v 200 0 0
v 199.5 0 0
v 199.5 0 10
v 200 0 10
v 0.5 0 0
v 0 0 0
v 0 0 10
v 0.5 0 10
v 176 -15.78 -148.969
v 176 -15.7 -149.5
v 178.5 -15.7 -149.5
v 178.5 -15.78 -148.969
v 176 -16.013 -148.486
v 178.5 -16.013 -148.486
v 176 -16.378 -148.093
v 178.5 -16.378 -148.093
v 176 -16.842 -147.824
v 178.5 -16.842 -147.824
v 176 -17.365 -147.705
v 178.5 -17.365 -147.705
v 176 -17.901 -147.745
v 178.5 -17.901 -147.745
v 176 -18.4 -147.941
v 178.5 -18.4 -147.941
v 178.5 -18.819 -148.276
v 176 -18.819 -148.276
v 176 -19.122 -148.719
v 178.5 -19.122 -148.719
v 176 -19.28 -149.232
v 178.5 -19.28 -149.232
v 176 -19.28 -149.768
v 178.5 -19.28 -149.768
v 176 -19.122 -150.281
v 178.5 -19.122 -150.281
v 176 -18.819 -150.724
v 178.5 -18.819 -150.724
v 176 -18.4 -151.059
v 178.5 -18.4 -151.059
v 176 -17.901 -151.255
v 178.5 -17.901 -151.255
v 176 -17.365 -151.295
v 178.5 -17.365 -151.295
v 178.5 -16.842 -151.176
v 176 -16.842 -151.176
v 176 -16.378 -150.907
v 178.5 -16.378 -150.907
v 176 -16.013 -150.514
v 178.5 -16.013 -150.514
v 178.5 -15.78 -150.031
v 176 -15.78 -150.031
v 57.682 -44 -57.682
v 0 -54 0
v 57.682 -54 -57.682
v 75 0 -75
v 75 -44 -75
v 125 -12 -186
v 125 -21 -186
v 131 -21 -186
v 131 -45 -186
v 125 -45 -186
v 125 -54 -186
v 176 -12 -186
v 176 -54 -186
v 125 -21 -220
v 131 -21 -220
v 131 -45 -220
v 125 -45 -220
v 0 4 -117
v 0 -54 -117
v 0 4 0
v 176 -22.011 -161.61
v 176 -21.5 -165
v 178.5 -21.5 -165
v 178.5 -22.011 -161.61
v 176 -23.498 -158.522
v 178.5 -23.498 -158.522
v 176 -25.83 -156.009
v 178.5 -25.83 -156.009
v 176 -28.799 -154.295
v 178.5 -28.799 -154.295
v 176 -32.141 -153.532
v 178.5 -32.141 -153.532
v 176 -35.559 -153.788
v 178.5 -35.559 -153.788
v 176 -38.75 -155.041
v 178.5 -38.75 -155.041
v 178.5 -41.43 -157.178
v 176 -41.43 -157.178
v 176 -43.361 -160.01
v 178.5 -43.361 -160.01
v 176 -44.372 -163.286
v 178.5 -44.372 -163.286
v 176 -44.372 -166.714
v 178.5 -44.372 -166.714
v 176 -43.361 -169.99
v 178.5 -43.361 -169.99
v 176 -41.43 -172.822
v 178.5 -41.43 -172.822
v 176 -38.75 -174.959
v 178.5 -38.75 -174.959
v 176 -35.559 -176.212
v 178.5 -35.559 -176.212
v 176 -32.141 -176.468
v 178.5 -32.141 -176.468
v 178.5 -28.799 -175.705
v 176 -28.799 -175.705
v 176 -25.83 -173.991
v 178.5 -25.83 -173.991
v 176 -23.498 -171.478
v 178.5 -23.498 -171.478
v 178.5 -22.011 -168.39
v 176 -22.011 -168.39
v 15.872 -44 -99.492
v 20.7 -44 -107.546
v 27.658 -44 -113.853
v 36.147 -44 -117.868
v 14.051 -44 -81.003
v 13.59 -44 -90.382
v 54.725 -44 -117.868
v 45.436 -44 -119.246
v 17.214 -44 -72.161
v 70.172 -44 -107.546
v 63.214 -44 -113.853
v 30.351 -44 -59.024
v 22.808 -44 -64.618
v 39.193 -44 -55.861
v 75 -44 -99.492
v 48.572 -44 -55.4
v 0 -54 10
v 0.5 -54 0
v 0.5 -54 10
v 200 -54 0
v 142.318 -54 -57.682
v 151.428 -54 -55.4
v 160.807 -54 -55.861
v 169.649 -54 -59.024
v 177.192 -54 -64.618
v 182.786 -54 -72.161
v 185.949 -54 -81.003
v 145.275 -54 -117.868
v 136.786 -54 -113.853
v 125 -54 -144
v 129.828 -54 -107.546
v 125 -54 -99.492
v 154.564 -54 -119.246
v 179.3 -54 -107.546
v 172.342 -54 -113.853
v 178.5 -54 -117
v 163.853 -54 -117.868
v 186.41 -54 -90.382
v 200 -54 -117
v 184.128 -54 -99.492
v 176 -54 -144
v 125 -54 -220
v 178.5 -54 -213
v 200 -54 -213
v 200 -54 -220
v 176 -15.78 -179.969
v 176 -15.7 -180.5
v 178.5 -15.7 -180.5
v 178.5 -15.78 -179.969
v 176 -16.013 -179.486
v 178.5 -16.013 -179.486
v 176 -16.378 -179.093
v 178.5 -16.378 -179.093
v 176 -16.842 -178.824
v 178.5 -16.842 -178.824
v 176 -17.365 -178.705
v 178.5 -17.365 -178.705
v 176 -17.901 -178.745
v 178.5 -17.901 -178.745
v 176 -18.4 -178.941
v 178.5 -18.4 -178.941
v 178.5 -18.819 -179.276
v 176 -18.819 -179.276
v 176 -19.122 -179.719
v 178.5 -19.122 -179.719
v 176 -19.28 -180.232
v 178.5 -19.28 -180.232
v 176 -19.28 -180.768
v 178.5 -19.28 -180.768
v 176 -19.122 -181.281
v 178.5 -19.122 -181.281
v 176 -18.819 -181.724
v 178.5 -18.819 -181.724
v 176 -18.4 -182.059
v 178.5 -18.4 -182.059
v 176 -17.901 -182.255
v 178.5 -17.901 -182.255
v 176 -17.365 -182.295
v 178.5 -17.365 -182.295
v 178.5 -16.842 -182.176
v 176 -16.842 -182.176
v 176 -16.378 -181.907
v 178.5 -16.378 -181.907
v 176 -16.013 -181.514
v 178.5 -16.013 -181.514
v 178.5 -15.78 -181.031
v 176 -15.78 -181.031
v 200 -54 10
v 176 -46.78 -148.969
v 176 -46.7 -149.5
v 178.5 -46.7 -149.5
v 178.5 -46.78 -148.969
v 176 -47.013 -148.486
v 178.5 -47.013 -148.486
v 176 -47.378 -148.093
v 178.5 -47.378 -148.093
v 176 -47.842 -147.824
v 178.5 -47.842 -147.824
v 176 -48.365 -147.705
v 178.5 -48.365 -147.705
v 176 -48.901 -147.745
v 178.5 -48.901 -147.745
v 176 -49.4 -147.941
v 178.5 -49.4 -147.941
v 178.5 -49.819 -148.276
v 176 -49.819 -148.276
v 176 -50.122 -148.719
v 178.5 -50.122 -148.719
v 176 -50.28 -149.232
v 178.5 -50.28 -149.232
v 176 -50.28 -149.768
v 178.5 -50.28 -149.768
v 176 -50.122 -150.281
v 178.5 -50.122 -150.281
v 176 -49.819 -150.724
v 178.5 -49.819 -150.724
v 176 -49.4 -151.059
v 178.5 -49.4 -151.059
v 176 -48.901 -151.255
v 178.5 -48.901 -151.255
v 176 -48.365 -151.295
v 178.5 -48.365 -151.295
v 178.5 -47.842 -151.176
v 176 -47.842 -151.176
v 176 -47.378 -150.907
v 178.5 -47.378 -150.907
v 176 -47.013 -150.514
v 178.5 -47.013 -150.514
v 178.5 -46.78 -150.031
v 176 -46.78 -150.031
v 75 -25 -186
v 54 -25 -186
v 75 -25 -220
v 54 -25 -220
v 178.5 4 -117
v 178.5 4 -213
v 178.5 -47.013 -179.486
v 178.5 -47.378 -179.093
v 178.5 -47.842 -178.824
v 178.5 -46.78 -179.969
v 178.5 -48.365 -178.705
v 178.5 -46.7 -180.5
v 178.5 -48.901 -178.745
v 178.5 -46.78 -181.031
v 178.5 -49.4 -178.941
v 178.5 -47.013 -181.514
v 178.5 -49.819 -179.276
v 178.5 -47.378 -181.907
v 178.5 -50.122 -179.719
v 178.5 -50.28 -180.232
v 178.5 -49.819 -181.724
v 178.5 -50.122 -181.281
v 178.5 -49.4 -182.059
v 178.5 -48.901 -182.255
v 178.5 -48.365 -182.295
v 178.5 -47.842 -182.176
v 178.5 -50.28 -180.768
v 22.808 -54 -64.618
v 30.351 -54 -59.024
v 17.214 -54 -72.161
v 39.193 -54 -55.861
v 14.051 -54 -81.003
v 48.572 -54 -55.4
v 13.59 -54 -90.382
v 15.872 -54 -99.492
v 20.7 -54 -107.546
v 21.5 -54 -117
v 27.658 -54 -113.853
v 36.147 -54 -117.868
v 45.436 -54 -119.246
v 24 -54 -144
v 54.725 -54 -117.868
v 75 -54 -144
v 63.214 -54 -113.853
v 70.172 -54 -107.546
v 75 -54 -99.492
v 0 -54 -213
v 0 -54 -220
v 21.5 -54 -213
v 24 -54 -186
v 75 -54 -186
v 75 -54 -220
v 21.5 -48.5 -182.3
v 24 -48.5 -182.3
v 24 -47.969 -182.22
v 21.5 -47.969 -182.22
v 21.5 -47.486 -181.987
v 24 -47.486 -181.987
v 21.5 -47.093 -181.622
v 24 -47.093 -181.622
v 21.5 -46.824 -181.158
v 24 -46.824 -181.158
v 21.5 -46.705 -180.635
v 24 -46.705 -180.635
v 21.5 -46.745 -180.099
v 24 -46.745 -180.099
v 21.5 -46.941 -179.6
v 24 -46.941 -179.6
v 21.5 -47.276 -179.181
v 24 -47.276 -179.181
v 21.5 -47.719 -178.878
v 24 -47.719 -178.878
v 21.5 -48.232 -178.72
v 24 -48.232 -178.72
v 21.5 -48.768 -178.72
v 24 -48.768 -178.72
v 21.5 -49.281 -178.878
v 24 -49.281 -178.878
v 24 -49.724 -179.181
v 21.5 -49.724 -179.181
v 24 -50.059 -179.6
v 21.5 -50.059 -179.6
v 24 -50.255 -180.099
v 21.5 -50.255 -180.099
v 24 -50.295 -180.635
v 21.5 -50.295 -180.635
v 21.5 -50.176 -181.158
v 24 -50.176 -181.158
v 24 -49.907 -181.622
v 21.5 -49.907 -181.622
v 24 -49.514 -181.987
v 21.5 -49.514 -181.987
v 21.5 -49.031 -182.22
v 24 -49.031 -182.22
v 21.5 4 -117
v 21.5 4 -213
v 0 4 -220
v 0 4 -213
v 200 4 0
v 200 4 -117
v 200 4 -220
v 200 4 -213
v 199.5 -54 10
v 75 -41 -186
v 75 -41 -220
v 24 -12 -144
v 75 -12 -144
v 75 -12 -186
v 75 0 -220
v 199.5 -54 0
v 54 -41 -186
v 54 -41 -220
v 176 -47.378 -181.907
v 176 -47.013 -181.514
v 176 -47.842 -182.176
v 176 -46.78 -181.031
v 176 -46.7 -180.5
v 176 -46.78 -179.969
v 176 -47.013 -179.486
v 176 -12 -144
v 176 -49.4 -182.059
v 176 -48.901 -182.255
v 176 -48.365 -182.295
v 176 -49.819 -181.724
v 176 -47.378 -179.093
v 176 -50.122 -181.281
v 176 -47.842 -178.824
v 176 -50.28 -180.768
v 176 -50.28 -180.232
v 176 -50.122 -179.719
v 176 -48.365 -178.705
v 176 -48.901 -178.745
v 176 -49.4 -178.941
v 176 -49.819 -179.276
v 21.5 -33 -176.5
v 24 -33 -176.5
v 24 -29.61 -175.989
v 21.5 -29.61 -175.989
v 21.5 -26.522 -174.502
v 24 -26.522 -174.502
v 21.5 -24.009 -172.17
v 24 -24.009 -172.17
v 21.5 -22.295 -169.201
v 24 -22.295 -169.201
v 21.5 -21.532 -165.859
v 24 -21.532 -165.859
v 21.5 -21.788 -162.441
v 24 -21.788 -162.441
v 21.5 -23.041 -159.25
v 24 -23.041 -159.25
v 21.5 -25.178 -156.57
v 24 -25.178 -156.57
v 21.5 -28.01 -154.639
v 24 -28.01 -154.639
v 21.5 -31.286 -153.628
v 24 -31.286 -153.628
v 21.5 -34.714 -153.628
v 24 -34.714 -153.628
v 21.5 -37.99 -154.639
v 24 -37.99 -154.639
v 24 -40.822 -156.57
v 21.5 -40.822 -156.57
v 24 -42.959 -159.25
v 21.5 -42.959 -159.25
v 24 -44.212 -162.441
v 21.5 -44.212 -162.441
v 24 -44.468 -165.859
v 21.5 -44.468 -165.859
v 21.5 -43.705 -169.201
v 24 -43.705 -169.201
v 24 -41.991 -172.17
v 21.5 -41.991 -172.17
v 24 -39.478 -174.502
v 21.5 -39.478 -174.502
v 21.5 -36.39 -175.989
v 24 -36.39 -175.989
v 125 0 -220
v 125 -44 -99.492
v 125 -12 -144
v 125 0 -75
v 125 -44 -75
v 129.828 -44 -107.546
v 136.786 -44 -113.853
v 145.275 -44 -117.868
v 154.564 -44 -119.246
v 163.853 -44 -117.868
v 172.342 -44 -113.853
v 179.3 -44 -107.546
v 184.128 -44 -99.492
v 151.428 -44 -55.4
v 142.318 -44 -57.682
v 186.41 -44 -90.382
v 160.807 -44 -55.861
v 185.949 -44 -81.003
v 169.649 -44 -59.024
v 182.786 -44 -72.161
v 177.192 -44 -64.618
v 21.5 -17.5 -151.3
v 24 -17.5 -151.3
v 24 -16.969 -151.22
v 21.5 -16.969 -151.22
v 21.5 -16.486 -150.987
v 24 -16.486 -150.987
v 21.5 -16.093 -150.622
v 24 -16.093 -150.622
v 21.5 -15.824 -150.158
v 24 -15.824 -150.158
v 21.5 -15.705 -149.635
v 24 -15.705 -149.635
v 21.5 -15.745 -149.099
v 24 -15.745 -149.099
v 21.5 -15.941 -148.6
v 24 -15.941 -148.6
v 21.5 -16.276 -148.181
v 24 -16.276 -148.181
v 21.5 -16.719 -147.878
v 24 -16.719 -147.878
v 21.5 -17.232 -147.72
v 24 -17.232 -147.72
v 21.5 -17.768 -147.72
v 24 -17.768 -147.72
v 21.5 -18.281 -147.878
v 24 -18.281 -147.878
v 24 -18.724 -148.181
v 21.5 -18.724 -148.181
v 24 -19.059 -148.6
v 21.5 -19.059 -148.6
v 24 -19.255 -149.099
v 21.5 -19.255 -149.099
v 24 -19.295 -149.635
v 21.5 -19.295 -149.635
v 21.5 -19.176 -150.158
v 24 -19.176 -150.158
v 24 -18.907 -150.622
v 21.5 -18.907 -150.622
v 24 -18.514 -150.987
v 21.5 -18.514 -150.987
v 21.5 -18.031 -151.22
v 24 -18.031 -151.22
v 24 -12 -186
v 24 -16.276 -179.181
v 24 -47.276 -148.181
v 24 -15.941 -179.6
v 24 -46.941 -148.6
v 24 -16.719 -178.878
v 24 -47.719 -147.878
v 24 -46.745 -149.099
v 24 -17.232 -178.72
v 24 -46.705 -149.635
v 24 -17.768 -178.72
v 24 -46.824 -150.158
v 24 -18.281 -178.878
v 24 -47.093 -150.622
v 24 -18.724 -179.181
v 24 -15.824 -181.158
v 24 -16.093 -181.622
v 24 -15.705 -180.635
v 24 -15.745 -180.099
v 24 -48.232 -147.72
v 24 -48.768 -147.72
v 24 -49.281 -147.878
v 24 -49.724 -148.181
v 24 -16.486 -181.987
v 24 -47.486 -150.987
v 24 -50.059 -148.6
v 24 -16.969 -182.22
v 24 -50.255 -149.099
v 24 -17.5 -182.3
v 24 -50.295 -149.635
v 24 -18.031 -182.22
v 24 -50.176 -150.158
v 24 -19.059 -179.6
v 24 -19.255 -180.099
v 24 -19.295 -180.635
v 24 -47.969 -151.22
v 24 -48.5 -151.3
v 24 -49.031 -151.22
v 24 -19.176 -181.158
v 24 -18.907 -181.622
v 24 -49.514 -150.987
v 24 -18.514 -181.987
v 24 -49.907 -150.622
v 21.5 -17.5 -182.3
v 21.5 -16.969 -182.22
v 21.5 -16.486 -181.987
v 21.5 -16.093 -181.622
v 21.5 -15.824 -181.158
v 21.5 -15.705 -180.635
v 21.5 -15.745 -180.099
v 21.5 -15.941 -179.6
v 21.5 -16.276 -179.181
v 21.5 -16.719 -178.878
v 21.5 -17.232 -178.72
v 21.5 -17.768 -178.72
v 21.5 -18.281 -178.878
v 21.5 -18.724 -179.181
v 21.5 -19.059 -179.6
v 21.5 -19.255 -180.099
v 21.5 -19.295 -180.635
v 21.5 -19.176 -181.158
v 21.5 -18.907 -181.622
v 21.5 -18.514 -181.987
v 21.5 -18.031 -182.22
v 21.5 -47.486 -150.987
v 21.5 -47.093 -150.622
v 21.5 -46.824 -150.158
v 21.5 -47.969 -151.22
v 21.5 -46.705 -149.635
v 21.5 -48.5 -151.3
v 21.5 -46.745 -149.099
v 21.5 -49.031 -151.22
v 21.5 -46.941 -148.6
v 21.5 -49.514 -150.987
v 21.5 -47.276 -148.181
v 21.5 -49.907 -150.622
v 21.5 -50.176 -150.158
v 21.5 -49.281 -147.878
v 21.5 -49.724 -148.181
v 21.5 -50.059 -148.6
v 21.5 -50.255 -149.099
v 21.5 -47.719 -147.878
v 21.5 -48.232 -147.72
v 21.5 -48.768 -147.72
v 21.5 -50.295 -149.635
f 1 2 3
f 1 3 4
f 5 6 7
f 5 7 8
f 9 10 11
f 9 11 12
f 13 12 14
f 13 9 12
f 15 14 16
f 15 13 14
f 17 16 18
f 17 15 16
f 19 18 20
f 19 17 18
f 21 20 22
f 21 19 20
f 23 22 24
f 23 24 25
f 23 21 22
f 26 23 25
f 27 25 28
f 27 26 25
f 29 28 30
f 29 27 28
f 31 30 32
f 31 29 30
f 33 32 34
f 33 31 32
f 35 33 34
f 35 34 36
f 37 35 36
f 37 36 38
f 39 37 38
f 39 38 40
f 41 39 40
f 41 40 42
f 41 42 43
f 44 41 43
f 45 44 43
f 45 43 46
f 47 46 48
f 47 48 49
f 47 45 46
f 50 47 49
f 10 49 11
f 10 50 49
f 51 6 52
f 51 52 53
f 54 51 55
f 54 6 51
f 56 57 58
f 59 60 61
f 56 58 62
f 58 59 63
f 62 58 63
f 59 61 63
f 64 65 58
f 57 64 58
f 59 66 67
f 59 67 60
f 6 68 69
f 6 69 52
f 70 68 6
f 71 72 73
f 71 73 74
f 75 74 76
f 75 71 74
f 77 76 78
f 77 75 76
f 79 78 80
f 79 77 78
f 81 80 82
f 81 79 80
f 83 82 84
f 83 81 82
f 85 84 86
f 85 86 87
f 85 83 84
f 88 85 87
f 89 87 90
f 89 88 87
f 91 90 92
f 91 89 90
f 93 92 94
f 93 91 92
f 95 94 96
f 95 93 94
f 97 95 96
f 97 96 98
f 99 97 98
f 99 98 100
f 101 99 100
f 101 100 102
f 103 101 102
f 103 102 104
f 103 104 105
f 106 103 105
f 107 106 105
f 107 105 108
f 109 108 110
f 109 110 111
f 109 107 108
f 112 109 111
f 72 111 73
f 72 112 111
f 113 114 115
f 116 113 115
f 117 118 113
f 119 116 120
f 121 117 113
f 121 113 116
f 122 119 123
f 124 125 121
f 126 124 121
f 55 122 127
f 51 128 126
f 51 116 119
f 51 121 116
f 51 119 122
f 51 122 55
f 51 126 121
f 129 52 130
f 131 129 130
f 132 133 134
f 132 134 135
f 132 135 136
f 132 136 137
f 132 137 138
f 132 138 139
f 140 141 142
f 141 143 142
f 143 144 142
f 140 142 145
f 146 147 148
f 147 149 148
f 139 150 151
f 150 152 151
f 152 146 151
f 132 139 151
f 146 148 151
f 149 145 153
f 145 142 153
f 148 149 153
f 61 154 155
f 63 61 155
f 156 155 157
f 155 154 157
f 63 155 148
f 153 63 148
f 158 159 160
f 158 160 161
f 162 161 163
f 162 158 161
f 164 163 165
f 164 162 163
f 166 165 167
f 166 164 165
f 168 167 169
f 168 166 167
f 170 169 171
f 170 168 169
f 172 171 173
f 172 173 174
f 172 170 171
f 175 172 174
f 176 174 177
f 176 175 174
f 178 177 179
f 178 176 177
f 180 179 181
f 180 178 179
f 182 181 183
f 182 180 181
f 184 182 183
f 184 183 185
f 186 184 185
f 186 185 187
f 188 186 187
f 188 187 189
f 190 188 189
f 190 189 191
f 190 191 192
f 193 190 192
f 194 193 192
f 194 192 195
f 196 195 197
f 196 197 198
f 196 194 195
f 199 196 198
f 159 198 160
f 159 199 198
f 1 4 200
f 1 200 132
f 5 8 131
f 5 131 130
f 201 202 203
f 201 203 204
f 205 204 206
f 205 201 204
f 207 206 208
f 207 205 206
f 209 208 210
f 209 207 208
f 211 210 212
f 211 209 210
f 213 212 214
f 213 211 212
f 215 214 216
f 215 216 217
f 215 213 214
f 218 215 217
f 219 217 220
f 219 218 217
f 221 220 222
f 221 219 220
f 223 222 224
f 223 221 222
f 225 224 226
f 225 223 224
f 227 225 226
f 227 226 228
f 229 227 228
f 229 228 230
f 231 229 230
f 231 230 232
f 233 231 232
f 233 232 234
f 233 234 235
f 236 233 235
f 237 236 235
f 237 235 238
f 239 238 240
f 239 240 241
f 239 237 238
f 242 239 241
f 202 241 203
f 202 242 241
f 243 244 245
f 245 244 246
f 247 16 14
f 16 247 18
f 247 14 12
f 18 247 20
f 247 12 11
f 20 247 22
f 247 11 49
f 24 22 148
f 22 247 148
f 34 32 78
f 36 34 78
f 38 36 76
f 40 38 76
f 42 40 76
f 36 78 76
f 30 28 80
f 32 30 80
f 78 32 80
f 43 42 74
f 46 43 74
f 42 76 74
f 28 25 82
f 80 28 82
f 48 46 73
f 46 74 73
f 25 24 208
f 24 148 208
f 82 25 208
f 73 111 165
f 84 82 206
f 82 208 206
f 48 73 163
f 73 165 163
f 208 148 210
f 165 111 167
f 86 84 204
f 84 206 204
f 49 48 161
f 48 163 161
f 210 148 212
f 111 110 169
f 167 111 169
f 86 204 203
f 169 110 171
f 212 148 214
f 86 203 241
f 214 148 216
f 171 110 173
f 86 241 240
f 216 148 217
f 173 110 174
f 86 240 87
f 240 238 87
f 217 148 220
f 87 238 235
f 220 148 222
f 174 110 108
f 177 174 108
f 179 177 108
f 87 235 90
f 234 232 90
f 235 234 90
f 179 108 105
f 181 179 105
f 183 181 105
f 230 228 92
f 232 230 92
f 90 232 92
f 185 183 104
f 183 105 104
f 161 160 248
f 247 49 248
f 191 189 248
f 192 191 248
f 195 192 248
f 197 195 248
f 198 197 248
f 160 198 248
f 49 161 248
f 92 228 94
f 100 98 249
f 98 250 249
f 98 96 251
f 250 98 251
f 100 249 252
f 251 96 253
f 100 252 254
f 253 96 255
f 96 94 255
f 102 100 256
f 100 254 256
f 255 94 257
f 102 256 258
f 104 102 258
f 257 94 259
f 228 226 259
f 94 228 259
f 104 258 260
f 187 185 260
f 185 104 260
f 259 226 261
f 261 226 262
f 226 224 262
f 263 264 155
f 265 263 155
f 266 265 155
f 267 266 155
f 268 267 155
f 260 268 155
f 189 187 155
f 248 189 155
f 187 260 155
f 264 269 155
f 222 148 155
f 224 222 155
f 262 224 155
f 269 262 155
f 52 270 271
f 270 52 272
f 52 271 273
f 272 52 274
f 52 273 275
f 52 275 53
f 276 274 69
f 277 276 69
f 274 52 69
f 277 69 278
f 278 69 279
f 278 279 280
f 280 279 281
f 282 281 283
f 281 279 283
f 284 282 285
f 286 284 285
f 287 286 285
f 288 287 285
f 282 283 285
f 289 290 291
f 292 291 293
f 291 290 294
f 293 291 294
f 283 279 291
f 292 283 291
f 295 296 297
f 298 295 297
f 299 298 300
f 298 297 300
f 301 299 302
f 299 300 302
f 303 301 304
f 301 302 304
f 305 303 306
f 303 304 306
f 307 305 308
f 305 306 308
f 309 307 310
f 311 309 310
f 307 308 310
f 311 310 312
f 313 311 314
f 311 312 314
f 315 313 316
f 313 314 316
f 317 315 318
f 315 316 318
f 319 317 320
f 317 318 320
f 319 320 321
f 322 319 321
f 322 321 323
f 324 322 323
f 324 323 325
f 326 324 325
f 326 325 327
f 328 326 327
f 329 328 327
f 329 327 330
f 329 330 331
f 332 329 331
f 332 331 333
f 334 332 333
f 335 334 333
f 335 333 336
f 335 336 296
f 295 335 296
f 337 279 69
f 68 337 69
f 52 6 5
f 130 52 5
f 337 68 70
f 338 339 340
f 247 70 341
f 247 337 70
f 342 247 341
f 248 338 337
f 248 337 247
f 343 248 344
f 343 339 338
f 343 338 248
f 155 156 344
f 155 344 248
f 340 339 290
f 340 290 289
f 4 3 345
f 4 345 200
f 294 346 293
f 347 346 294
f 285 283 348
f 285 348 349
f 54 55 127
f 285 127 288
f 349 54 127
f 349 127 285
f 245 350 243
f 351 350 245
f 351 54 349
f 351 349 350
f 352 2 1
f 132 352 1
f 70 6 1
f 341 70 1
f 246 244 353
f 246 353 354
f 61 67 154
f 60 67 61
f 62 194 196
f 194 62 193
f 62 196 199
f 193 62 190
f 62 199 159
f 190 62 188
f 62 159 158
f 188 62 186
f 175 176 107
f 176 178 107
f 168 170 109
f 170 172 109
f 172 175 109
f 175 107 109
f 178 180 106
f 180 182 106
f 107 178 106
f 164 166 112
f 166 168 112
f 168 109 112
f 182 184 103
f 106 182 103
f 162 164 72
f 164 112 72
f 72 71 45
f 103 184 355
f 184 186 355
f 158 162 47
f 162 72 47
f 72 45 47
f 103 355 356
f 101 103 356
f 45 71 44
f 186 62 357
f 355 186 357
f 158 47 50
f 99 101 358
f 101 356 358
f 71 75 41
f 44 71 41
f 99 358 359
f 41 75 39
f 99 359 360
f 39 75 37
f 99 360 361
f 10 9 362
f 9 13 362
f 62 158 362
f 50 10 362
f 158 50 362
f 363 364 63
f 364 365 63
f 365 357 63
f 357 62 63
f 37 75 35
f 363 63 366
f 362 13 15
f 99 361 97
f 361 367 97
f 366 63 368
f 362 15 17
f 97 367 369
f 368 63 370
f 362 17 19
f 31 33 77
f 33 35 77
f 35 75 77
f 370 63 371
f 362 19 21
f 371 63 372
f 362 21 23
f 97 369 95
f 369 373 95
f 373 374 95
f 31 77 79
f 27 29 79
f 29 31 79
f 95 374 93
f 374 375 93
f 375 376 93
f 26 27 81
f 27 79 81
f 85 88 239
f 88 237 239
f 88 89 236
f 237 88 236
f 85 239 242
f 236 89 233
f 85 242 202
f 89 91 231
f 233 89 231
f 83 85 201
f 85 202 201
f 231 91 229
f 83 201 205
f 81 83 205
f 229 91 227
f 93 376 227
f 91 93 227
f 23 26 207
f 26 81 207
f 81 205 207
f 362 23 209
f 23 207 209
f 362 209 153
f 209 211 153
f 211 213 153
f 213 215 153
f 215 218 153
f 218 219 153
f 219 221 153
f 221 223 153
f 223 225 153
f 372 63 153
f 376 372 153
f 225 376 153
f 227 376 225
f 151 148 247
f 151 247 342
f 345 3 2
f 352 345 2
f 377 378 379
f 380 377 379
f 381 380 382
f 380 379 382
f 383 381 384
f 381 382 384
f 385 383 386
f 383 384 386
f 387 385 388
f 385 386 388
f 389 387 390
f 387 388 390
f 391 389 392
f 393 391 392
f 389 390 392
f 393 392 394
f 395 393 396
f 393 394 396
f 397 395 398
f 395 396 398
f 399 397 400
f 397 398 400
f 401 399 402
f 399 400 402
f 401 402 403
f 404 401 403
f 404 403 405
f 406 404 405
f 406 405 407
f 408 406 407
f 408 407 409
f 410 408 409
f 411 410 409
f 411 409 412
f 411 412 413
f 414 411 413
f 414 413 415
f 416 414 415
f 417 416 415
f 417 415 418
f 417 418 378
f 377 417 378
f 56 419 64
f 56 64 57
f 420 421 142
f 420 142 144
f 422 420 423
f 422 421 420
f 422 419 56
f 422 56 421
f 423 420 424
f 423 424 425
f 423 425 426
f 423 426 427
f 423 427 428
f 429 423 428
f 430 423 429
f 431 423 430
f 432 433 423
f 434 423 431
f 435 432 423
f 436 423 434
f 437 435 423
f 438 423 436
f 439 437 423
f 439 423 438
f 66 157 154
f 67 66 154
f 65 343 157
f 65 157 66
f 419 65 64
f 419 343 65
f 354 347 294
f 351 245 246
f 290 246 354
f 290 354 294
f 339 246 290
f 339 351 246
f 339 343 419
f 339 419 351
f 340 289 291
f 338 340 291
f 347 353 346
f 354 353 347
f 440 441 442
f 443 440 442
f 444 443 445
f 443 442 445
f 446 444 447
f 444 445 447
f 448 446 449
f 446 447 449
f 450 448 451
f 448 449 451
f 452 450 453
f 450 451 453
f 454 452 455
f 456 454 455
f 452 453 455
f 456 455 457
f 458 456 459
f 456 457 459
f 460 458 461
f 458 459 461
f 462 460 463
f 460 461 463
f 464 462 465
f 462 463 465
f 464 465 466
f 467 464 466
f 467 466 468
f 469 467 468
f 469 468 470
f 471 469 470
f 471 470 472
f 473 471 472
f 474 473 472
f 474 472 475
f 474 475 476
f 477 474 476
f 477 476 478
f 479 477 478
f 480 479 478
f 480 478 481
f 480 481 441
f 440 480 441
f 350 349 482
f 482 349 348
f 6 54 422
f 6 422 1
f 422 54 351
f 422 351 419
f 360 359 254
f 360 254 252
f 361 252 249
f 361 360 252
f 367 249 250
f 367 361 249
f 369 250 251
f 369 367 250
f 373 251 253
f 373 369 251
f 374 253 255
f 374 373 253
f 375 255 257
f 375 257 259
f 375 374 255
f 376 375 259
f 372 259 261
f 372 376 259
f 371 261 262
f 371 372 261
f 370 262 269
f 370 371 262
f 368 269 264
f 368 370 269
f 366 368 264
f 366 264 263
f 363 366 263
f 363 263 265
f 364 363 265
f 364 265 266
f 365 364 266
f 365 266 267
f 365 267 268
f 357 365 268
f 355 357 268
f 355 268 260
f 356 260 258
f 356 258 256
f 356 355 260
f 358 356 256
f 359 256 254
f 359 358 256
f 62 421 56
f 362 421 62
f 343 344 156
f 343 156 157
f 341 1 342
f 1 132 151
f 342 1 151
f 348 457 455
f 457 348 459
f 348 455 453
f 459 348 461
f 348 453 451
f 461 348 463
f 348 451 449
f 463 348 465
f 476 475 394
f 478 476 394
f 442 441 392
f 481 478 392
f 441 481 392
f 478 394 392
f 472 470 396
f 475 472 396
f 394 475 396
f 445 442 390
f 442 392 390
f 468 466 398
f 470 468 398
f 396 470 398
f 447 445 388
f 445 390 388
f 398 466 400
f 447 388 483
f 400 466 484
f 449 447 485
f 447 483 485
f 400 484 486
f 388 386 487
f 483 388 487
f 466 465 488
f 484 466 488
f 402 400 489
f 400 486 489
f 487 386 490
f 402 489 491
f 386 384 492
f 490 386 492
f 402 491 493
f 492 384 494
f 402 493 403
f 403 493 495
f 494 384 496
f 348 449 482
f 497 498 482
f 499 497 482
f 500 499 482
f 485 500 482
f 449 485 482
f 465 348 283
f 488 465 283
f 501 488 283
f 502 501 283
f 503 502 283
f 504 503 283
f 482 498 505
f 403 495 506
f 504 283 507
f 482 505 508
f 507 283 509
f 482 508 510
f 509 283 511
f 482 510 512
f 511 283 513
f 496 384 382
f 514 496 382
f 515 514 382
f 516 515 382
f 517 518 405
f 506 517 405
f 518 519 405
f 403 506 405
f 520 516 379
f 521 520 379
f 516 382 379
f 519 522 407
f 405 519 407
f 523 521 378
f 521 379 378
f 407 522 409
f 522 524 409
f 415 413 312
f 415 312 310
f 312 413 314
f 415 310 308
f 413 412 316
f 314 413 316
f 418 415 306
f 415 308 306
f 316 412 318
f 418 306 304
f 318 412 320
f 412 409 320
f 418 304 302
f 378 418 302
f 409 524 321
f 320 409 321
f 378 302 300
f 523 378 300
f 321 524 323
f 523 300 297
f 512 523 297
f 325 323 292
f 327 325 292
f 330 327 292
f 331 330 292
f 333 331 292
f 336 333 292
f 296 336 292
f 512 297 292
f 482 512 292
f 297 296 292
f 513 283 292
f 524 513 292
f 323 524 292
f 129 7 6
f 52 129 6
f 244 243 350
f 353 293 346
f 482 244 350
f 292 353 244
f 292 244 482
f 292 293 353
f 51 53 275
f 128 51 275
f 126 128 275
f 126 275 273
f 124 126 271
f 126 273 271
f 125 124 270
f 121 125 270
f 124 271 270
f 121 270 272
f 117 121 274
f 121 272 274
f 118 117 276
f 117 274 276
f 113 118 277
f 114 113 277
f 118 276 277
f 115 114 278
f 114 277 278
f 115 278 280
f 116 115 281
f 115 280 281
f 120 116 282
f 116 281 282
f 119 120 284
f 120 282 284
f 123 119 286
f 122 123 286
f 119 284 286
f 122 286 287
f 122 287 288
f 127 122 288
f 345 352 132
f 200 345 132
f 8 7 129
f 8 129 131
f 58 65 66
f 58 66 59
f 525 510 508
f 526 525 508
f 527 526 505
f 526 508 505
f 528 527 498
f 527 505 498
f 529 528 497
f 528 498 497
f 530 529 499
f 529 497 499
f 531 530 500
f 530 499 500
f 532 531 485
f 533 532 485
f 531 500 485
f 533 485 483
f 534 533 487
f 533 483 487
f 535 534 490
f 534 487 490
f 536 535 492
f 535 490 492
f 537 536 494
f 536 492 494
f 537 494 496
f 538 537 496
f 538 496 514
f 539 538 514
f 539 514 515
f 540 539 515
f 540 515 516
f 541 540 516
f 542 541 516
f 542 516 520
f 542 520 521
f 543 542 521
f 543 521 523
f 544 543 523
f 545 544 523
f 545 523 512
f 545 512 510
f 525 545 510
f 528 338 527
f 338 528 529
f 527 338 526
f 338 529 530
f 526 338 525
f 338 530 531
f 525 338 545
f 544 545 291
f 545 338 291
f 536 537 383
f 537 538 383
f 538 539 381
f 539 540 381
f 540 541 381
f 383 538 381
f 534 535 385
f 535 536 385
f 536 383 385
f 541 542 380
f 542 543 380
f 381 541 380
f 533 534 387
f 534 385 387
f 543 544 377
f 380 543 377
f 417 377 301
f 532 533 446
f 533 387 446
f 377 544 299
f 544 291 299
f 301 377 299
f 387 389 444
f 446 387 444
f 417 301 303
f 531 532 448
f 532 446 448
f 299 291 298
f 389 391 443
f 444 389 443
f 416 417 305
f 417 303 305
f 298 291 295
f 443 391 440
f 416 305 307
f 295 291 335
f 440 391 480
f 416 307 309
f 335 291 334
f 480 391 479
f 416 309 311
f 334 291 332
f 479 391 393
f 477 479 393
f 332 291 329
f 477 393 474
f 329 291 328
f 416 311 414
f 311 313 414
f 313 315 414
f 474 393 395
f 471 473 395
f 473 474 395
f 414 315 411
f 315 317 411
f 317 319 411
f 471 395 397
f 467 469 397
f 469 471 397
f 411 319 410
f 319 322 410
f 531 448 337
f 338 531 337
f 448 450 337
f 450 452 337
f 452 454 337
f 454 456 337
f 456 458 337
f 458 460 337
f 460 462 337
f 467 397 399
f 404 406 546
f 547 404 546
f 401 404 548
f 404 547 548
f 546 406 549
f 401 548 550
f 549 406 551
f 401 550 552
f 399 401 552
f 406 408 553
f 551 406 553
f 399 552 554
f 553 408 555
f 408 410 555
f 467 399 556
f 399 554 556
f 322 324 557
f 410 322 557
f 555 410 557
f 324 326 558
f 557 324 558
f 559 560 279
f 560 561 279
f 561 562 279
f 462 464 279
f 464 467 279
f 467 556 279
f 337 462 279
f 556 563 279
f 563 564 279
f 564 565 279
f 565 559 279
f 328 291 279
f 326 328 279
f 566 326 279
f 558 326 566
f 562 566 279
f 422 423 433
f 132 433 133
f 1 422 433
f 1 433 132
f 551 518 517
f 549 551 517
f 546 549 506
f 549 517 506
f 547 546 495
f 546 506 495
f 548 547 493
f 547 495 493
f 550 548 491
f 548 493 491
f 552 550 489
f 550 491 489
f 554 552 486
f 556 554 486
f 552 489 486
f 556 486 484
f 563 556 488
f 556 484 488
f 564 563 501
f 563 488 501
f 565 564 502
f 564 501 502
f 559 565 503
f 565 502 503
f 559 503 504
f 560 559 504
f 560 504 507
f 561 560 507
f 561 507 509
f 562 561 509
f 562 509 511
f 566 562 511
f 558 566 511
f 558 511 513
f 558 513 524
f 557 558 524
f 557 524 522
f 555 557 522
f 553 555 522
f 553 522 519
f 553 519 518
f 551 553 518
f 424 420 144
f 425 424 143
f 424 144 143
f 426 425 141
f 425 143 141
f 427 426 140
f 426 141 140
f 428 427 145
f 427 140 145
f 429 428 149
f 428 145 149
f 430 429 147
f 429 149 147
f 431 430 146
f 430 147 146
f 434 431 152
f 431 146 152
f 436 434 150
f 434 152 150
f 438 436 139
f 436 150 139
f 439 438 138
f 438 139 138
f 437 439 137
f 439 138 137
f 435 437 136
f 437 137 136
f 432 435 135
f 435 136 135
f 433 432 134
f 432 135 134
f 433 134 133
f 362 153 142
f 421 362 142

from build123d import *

# Parameters (mm, degrees)
SKETCH_1_W              = 200
SKETCH_1_H              = 220
EXTRUDE_1_DEPTH         = 4
EXTRUDE_2_DEPTH         = 54
SKETCH_1_5_W            = 0.5
SKETCH_1_5_H            = 10
EXTRUDE_3_DEPTH         = 54
EXTRUDE_3_2_DEPTH       = 54
CUT_EXTRUDE_2_DEPTH     = 303.925733473
CUT_EXTRUDE_3_DEPTH     = 42
SKETCH_7_R              = 1.8
SKETCH_7_R_2            = 11.5
CUT_EXTRUDE_4_DEPTH     = 287.865822293
MIRROR_START            = 176
MIRROR_1_OUTLINE_R      = 1.8
MIRROR_1_OUTLINE_R_2    = 11.5
MIRROR_1_DEPTH          = 2.5
CUT_EXTRUDE_START       = -21
CUT_EXTRUDE_5_OUTLINE_W = 34
CUT_EXTRUDE_5_OUTLINE_H = 16
CUT_EXTRUDE_5_DEPTH     = 21
CUT_EXTRUDE_START_2     = -6
CUT_EXTRUDE_6_OUTLINE_W = 34
CUT_EXTRUDE_6_OUTLINE_H = 24
CUT_EXTRUDE_6_DEPTH     = 6
SKETCH_11_R             = 32
CUT_EXTRUDE_7_DEPTH     = 10


# Read off the part's stored shape, not the designer's step: 镜向1, 切除-拉伸5, 切除-拉伸6
with BuildPart() as part:
    # 草图1 → 凸台-拉伸1 (new body)
    with BuildSketch(Plane(origin=(0, 0, 0), x_dir=(1, 0, 0), z_dir=(0, 1, 0))):
        with Locations((100, 110)):
            Rectangle(SKETCH_1_W, SKETCH_1_H)
    extrude(amount=EXTRUDE_1_DEPTH)

    # 草图1<4> → 凸台-拉伸2 (add)
    with BuildSketch(Plane(origin=(0, 0, 0), x_dir=(1, 0, 0), z_dir=(0, 1, 0))):
        Polygon((0, 220), (0, 0), (75, 75), (75, 220), align=None)
        Polygon((125, 220), (125, 75), (200, 0), (200, 220), align=None)
    extrude(amount=-EXTRUDE_2_DEPTH)

    # 草图3 → 切除-拉伸2 (cut, through all)
    with BuildSketch(Plane.XZ.offset(54)):
        Polygon((21.5, -186), (21.5, -165), (21.5, -144), (21.5, -117), (0, -117), (0, -213), (21.5, -213), align=None)
        Polygon((178.5, -117), (200, -117), (200, -213), (178.5, -213), (178.5, -165), align=None)
    extrude(amount=-CUT_EXTRUDE_2_DEPTH, mode=Mode.SUBTRACT)

    # 草图5 → 切除-拉伸3 (cut)
    with BuildSketch(Plane.XZ.offset(54)):
        Polygon((176, -165), (176, -144), (125, -144), (125, -186), (176, -186), align=None)
        Polygon((24, -165), (24, -144), (75, -144), (75, -186), (24, -186), align=None)
    extrude(amount=-CUT_EXTRUDE_3_DEPTH, mode=Mode.SUBTRACT)

    # 草图7 → 切除-拉伸4 (cut, through all)
    with BuildSketch(Plane(origin=(24, 0, 0), x_dir=(0, 0, -1), z_dir=(1, 0, 0))):
        with Locations((180.5, -17.5)):
            Circle(SKETCH_7_R)
        with Locations((149.5, -17.5)):
            Circle(SKETCH_7_R)
        with Locations((165, -33)):
            Circle(SKETCH_7_R_2)
        with Locations((180.5, -48.5)):
            Circle(SKETCH_7_R)
        with Locations((149.5, -48.5)):
            Circle(SKETCH_7_R)
    extrude(amount=-CUT_EXTRUDE_4_DEPTH, mode=Mode.SUBTRACT)

    # 镜向1 outline → 镜向1 (cut)
    with BuildSketch(Plane.YZ.offset(MIRROR_START)):
        with Locations((-17.5, -180.5)):
            Circle(MIRROR_1_OUTLINE_R)
        with Locations((-17.5, -149.5)):
            Circle(MIRROR_1_OUTLINE_R)
        with Locations((-33, -165)):
            Circle(MIRROR_1_OUTLINE_R_2)
        with Locations((-48.5, -180.5)):
            Circle(MIRROR_1_OUTLINE_R)
        with Locations((-48.5, -149.5)):
            Circle(MIRROR_1_OUTLINE_R)
    extrude(amount=MIRROR_1_DEPTH, mode=Mode.SUBTRACT)

    # 切除-拉伸5 outline → 切除-拉伸5 (cut)
    with BuildSketch(Plane(origin=(75, 0, 0), x_dir=(0, 0, -1), z_dir=(1, 0, 0)).offset(CUT_EXTRUDE_START)):
        with Locations((203, -33)):
            Rectangle(CUT_EXTRUDE_5_OUTLINE_W, CUT_EXTRUDE_5_OUTLINE_H)
    extrude(amount=CUT_EXTRUDE_5_DEPTH, mode=Mode.SUBTRACT)

    # 切除-拉伸6 outline → 切除-拉伸6 (cut)
    with BuildSketch(Plane.ZY.offset(-125).offset(CUT_EXTRUDE_START_2)):
        with Locations((-203, -33)):
            Rectangle(CUT_EXTRUDE_6_OUTLINE_W, CUT_EXTRUDE_6_OUTLINE_H)
    extrude(amount=CUT_EXTRUDE_6_DEPTH, mode=Mode.SUBTRACT)

    # 草图11 → 切除-拉伸7 (cut)
    with BuildSketch(Plane.XZ.offset(54)):
        with BuildLine():
            Line((75, -75), (57.681724795, -57.681724795))
            ThreePointArc((57.681724795, -57.681724795), (15.871709919, -99.491739671), (75, -99.491739671))
            Line((75, -99.491739671), (75, -75))
        make_face()
        with Locations((154.56414504, -87.245869836)):
            Circle(SKETCH_11_R)
    extrude(amount=-CUT_EXTRUDE_7_DEPTH, mode=Mode.SUBTRACT)


with BuildPart() as body_2:
    # 草图1<5> → 凸台-拉伸3 (new body)
    with BuildSketch(Plane(origin=(0, 0, 0), x_dir=(1, 0, 0), z_dir=(0, 1, 0))):
        with Locations((199.75, -5)):
            Rectangle(SKETCH_1_5_W, SKETCH_1_5_H)
    extrude(amount=-EXTRUDE_3_DEPTH)


with BuildPart() as body_3:
    # 草图1<5> → Extrude 3 2 (new body)
    with BuildSketch(Plane(origin=(0, 0, 0), x_dir=(1, 0, 0), z_dir=(0, 1, 0))):
        with Locations((0.25, -5)):
            Rectangle(SKETCH_1_5_W, SKETCH_1_5_H)
    extrude(amount=-EXTRUDE_3_2_DEPTH)


solid = Compound([part.part, body_2.part, body_3.part])
